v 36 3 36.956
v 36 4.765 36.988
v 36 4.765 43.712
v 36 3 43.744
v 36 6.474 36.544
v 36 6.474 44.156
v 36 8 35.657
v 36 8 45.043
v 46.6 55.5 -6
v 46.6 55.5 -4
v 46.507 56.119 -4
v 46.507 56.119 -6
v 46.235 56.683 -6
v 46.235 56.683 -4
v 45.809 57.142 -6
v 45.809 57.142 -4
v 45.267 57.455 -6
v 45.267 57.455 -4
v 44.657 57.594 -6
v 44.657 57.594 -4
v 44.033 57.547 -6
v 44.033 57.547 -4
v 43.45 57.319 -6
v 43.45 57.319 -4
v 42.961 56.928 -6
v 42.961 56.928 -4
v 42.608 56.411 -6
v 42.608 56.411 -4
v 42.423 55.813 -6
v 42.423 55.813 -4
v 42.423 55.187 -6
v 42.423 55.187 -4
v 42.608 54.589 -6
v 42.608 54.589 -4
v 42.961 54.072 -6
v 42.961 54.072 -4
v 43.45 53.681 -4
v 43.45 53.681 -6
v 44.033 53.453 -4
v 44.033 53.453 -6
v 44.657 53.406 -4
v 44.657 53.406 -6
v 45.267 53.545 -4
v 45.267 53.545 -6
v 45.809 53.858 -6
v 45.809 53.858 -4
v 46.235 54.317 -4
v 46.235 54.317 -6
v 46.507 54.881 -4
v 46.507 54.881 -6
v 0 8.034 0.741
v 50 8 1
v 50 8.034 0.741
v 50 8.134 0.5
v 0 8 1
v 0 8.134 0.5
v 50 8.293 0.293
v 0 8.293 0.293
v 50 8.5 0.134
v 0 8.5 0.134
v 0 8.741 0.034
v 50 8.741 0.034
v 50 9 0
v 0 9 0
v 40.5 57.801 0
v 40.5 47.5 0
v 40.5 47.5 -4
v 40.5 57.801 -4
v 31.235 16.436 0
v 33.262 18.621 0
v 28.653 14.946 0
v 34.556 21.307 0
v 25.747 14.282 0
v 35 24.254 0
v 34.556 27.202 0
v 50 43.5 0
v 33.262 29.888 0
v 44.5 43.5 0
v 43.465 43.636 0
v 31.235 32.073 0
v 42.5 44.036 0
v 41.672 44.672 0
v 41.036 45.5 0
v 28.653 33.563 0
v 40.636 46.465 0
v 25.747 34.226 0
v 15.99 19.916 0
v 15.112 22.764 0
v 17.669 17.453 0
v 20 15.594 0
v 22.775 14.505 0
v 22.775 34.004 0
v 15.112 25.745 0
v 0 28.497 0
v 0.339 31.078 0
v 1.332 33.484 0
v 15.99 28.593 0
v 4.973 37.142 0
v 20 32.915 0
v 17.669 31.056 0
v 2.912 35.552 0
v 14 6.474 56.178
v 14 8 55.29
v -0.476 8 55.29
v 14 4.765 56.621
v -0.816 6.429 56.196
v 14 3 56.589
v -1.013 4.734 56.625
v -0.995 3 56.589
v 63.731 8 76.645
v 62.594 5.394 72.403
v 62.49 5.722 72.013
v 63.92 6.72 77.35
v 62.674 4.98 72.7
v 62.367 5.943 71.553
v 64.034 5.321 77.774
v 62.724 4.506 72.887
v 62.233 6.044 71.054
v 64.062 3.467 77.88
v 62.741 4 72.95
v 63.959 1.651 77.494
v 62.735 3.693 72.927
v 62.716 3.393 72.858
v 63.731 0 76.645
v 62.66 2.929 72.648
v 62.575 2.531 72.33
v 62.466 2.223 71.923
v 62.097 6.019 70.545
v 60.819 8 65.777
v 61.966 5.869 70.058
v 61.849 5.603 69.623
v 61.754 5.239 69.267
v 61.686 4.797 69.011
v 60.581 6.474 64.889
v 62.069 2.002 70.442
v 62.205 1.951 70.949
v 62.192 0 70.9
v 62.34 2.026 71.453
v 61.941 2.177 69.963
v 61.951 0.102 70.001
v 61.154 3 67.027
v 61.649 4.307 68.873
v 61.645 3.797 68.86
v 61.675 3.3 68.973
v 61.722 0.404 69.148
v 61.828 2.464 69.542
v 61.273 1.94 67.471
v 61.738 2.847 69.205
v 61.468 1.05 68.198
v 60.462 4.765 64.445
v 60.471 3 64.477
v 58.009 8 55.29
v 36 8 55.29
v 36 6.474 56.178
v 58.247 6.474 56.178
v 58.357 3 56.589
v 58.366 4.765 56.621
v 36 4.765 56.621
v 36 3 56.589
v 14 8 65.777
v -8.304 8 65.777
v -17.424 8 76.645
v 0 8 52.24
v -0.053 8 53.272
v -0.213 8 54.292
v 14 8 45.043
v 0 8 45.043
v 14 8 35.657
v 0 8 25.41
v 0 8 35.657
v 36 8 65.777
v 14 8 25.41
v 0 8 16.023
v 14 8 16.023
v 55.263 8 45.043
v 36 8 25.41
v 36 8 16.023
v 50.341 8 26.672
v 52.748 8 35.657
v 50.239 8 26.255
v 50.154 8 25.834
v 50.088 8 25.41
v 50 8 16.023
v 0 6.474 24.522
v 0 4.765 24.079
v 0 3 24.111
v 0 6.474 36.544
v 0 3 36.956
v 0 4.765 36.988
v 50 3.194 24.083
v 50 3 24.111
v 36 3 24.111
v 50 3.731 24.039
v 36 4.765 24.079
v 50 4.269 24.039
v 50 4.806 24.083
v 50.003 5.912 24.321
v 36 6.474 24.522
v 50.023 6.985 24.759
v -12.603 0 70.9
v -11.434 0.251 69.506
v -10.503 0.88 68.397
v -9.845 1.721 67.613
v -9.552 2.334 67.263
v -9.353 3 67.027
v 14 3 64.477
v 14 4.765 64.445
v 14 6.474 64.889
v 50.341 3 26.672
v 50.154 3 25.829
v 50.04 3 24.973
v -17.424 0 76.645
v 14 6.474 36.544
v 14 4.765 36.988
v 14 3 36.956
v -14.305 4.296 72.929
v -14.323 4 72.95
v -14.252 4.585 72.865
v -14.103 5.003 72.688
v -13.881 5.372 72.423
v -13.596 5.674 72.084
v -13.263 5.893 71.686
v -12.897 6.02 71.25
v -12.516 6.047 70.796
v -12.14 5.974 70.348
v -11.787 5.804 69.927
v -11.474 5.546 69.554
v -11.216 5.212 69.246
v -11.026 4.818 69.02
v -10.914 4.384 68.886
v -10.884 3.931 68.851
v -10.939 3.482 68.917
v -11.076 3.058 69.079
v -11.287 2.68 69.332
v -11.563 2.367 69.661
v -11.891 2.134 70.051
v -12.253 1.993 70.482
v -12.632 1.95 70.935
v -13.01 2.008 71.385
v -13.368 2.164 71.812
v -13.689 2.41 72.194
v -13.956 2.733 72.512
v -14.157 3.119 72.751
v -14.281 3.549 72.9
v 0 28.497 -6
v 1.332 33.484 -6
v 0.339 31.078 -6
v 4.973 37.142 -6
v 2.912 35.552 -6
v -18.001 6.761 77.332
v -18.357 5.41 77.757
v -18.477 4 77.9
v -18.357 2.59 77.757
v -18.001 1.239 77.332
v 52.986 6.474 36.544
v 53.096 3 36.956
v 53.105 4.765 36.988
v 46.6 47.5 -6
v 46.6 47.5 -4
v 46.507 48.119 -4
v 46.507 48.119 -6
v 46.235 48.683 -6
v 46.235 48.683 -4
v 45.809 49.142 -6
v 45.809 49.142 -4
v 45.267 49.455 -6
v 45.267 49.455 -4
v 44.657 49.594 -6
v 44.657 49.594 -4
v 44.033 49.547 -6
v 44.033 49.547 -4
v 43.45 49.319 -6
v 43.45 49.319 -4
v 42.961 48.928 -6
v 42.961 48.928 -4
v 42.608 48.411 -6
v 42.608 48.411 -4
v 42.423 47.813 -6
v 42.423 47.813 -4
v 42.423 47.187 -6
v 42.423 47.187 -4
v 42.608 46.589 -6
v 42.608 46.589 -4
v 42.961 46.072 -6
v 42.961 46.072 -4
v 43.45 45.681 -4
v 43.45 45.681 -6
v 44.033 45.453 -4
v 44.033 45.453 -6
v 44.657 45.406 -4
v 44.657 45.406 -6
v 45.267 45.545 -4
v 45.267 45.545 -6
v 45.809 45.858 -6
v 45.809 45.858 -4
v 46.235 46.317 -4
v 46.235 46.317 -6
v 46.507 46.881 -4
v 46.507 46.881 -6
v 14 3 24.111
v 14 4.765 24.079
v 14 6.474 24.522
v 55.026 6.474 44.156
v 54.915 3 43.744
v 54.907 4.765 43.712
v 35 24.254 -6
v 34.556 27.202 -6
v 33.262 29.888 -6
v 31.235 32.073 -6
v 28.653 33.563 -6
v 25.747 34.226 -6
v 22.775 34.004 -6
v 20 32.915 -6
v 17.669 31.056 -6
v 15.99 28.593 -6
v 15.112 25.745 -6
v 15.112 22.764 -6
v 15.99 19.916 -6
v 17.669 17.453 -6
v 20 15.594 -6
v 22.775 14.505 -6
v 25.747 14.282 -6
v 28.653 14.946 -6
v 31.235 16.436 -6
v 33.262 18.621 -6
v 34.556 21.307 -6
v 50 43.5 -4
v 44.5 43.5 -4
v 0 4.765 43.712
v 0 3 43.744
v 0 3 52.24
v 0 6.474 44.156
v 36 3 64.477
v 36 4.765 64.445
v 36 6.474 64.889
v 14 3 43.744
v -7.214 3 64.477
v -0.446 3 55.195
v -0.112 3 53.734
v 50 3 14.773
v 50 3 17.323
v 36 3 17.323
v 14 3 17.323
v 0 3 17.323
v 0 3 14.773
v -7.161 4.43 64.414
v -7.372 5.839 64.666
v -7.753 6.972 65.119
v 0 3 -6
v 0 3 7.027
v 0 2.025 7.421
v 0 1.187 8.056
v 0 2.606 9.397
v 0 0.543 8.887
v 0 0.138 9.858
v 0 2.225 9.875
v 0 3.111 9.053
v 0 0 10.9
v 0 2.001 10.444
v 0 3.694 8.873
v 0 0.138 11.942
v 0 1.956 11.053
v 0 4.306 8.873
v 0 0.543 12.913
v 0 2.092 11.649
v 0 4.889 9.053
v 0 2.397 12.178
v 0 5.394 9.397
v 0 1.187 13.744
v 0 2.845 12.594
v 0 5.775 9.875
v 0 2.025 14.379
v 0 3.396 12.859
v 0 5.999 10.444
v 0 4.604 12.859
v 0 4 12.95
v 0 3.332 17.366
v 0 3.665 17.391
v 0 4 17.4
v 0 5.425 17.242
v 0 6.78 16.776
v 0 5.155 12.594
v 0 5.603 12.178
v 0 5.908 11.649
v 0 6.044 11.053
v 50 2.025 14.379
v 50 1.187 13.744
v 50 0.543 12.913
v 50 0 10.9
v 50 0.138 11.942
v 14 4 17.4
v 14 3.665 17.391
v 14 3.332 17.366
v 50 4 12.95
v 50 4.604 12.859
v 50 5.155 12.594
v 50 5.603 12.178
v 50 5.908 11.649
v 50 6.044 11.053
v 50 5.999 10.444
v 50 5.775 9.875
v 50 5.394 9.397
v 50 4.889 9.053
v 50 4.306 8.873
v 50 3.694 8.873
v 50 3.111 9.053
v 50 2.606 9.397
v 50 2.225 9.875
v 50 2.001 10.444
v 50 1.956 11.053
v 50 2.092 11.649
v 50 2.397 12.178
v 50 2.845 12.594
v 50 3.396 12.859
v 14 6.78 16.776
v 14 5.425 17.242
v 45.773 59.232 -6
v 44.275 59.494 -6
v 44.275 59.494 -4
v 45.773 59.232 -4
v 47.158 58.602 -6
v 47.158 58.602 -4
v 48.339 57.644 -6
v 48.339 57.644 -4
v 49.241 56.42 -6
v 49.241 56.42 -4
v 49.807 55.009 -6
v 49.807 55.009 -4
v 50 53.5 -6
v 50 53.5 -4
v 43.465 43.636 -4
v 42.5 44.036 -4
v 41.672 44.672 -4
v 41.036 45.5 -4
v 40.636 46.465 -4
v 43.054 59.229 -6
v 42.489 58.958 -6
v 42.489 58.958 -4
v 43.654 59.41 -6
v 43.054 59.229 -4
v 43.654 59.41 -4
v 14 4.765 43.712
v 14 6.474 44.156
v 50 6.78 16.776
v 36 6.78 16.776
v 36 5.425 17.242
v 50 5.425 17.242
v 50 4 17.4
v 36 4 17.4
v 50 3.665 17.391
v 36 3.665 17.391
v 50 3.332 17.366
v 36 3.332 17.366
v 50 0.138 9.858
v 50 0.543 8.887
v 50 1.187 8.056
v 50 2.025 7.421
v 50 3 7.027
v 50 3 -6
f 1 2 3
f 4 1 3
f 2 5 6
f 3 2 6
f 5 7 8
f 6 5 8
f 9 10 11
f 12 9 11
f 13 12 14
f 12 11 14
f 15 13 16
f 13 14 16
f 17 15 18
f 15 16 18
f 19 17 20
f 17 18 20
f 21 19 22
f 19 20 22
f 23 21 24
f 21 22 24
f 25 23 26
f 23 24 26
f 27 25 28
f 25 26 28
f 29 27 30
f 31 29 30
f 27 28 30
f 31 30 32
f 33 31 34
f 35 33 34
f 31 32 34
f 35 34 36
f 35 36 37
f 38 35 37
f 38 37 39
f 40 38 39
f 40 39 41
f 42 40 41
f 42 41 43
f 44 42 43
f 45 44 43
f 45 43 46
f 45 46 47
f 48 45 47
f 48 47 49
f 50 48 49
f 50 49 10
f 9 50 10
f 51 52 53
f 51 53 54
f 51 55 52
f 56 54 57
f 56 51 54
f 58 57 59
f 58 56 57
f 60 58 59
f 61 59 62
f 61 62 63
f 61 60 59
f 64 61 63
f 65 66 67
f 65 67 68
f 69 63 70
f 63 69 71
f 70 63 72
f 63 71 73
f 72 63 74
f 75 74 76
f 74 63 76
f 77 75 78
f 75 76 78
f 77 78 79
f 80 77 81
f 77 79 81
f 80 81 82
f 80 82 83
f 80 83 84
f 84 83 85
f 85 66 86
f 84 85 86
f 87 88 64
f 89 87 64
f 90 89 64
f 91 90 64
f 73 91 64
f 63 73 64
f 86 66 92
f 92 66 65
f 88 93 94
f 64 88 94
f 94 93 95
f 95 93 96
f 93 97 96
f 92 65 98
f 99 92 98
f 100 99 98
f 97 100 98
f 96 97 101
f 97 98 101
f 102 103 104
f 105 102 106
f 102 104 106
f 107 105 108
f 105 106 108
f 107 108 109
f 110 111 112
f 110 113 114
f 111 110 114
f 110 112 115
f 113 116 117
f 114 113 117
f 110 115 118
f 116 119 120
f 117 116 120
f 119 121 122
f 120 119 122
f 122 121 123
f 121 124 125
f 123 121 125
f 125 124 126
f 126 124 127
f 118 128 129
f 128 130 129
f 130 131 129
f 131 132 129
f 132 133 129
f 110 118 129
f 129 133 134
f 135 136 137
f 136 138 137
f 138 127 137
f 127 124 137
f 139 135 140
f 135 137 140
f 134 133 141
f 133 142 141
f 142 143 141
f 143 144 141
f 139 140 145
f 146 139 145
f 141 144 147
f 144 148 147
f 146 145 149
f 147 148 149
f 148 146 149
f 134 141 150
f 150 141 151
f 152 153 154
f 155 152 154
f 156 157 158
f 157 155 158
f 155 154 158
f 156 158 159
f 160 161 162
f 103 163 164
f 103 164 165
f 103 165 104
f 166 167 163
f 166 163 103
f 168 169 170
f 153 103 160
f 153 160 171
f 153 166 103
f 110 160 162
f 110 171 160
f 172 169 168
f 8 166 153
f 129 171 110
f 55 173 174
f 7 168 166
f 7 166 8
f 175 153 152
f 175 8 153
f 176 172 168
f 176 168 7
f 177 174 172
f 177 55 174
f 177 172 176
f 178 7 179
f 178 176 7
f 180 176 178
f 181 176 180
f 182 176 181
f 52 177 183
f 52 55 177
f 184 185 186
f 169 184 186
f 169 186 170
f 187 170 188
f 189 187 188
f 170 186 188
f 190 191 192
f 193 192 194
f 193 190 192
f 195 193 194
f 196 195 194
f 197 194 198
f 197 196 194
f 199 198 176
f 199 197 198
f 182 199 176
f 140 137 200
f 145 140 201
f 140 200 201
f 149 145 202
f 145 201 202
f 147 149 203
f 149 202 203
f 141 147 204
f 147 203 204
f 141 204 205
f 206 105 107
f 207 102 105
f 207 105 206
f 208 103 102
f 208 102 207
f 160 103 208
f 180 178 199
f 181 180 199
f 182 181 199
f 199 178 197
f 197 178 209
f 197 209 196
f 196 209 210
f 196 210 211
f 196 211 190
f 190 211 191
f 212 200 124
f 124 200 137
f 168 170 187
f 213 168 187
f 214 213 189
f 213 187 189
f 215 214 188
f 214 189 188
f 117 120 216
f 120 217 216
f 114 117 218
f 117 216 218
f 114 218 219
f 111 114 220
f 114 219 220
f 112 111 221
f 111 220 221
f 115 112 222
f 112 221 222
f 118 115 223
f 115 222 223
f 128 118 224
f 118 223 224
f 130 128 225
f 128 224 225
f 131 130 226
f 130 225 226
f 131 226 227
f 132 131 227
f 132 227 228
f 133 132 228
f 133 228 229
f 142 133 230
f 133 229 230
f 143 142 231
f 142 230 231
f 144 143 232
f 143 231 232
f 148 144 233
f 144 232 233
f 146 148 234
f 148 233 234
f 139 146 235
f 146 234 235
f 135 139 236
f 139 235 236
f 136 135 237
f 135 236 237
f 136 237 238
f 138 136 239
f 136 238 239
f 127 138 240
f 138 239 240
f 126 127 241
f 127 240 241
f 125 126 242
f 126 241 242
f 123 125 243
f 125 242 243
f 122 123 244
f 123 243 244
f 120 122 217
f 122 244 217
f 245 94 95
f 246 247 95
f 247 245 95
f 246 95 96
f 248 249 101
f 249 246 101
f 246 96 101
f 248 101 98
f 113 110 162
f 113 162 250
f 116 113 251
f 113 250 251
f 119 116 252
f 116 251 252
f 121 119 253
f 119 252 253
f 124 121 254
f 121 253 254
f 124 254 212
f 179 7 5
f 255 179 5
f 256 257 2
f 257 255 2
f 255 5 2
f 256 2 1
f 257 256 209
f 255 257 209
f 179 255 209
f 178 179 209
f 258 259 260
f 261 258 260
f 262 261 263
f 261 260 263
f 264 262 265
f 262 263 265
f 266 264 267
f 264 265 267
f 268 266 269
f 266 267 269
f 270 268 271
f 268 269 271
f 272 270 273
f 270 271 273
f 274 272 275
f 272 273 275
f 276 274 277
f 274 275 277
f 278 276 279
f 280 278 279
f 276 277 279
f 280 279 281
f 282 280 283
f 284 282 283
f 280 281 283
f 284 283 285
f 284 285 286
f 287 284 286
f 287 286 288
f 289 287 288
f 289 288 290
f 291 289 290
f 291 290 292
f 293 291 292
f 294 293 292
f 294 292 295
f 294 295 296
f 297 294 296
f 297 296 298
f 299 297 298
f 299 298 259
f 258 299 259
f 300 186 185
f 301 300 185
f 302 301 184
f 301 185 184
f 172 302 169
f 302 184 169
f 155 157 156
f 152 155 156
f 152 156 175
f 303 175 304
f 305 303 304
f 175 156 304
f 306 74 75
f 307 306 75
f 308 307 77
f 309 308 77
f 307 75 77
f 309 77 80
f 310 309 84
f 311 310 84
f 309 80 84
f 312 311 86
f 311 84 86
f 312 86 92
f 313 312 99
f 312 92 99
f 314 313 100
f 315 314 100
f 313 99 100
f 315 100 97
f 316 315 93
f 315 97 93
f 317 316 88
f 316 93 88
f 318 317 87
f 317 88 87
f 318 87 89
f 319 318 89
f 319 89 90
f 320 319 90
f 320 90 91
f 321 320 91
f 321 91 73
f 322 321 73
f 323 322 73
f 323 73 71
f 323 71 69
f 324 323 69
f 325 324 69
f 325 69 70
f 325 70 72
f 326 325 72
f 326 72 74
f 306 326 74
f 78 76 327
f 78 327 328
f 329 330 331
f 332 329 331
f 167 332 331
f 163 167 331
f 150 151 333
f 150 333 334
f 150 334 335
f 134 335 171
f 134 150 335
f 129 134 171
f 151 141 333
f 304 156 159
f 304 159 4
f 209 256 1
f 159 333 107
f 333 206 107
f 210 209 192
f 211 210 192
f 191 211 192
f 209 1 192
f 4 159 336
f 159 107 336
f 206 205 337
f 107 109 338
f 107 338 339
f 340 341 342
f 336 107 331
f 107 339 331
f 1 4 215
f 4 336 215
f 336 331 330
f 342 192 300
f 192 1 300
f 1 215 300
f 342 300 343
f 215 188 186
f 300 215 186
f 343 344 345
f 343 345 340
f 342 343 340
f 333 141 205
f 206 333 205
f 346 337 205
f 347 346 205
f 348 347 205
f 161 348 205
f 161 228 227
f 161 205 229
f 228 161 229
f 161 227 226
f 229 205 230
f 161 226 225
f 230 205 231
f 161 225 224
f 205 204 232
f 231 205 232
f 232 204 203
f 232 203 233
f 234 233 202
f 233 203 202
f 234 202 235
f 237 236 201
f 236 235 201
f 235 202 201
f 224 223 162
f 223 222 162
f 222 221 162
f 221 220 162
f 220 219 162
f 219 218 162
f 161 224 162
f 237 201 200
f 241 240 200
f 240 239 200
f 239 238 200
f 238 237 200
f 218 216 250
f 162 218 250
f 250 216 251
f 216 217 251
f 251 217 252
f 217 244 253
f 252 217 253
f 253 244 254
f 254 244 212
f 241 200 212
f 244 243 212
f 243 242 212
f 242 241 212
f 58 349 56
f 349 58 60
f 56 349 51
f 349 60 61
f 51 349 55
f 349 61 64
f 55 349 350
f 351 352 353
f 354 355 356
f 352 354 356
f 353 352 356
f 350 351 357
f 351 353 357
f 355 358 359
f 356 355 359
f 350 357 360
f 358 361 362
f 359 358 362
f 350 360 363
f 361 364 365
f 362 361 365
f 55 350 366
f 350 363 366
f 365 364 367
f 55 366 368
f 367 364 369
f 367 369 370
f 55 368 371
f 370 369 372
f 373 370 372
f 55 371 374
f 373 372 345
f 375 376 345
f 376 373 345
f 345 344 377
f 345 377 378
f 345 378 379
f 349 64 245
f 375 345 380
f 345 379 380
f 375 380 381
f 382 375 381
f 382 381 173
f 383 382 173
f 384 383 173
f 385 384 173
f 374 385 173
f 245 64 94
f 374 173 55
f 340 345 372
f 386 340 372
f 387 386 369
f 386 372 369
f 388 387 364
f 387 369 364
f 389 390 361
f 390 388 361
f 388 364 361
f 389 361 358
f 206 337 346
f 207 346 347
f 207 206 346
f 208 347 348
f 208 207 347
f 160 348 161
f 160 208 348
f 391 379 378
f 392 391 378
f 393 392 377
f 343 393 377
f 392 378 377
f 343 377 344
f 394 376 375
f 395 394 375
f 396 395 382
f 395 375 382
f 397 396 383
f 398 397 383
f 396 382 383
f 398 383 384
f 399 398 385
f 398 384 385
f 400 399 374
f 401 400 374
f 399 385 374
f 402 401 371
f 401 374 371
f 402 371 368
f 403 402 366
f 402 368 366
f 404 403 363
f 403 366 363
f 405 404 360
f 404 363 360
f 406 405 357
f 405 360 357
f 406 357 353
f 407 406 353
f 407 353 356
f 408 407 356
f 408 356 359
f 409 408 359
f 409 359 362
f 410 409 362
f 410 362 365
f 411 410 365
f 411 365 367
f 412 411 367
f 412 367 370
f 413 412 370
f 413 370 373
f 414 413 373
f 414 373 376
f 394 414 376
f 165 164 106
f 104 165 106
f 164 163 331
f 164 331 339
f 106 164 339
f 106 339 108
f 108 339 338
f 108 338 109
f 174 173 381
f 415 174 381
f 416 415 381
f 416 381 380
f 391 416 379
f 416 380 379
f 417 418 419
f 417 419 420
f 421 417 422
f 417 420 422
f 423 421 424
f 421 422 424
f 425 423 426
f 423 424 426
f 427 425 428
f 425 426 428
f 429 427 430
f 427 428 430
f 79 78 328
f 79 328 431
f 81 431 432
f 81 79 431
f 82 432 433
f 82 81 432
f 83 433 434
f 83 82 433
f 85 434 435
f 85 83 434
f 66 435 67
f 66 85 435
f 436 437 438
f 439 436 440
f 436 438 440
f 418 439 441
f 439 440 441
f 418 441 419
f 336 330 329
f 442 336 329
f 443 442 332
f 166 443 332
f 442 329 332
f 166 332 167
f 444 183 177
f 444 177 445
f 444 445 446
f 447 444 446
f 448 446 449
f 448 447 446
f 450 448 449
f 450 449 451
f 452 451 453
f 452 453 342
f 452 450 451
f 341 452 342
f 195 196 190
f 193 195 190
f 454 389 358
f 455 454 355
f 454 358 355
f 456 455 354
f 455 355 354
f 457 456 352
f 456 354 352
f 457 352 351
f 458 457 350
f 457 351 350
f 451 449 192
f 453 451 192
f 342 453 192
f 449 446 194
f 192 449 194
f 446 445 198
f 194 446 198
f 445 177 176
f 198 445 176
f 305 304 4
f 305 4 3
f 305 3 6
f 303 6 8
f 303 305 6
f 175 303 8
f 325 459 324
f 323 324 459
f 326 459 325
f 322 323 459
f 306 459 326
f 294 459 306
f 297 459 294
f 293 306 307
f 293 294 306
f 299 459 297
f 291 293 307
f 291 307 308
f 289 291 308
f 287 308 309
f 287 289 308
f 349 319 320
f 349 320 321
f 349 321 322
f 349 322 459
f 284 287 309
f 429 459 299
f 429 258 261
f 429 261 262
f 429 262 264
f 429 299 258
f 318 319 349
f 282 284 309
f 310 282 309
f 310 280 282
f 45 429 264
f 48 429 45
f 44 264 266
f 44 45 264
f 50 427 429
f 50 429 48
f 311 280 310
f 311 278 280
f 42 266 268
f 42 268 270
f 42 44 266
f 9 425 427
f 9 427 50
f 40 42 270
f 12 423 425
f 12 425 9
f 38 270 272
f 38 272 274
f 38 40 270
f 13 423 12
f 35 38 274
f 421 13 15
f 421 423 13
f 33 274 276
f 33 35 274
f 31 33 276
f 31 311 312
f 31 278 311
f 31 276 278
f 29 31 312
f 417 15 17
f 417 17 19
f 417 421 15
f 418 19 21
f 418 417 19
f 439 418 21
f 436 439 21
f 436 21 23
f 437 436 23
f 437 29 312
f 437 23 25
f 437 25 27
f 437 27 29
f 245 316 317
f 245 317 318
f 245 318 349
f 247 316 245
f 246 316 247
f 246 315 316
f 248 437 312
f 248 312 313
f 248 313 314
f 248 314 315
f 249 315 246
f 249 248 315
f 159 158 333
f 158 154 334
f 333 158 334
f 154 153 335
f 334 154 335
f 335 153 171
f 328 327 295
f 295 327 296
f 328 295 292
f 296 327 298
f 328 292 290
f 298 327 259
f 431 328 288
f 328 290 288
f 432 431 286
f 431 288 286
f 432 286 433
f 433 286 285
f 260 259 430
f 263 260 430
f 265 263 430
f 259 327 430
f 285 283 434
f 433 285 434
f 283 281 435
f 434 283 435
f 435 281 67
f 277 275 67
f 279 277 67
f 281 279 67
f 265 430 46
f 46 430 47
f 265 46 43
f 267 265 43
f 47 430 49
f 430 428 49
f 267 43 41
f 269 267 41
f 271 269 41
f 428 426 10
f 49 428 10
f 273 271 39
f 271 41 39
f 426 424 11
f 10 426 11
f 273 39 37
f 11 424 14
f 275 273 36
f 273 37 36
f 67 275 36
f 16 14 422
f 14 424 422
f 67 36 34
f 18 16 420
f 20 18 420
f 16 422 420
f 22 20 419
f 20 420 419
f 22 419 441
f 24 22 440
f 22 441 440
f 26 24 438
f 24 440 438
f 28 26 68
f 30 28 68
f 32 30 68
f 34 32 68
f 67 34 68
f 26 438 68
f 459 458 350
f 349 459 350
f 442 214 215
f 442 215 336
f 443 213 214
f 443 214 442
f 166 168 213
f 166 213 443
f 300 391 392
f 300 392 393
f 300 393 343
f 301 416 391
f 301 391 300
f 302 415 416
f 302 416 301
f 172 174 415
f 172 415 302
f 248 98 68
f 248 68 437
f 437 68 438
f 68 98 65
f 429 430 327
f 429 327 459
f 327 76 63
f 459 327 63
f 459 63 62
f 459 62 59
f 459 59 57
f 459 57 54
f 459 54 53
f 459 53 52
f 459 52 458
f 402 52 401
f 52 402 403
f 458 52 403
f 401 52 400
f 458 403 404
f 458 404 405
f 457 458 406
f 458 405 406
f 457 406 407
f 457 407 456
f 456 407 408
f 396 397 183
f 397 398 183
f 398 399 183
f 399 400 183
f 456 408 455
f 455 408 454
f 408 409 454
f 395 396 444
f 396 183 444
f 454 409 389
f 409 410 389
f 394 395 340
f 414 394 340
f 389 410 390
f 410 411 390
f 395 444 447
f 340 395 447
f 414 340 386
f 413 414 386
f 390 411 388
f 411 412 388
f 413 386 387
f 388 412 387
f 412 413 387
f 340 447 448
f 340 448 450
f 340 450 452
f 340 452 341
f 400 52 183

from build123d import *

# Parameters (mm, degrees)
BOSS_EXTRUDE1_DEPTH     = 8
SKETCH2_R               = 2.05
CUT_EXTRUDE1_DEPTH      = 28.707069821
CUT_EXTRUDE1_DEPTH_BACK = 68.014773719
CUT_EXTRUDE2_DEPTH      = 28.707069821
CUT_EXTRUDE2_DEPTH_BACK = 68.014773719
CUT_EXTRUDE3_DEPTH      = 19.476973879
CUT_EXTRUDE3_DEPTH_BACK = 14
CUT_EXTRUDE4_START      = -50
CUT_EXTRUDE4_DEPTH      = 14
CUT_EXTRUDE4_DEPTH_BACK = 15.067332603
BOSS_EXTRUDE2_DEPTH     = 6
FILLET8_R               = 1
SKETCH7_R               = 2.1
SKETCH7_R_2             = 10
CUT_EXTRUDE5_DEPTH      = 7
CUT_EXTRUDE6_DEPTH      = 4


with BuildPart() as part:
    # Sketch1 → Boss-Extrude1 (new body)
    with BuildSketch(Plane(origin=(0, 0, 0), x_dir=(1, 0, 0), z_dir=(0, 1, 0))):
        with BuildLine():
            Line((0, 0), (0, -52.240297657))
            ThreePointArc((0, -52.240297657), (-0.603073792, -55.660499091), (-2.339555569, -58.668173754))
            Line((-2.339555569, -58.668173754), (-27.707069821, -88.9))
            Line((-27.707069821, -88.9), (67.014773719, -88.9))
            Line((67.014773719, -88.9), (50.340741737, -26.671665475))
            ThreePointArc((50.340741737, -26.671665475), (50.085551386, -25.388736946), (50, -24.083475024))
            Line((50, -24.083475024), (50, 0))
            Line((50, 0), (0, 0))
        make_face()
    extrude(amount=BOSS_EXTRUDE1_DEPTH)

    # Sketch2 → Cut-Extrude1 (cut, two sides)
    with BuildSketch(Plane.ZY) as cut_extrude1_sk:
        with Locations((10.9, 4)):
            Circle(SKETCH2_R)
        with Locations((70.9, 4)):
            Circle(SKETCH2_R)
    extrude(amount=CUT_EXTRUDE1_DEPTH, mode=Mode.SUBTRACT)
    extrude(cut_extrude1_sk.sketch, amount=-CUT_EXTRUDE1_DEPTH_BACK, mode=Mode.SUBTRACT)

    # Sketch4 → Cut-Extrude2 (cut, two sides)
    with BuildSketch(Plane.ZY) as cut_extrude2_sk:
        with BuildLine():
            Line((67.027016654, 3), (14.772983346, 3))
            ThreePointArc((14.772983346, 3), (13.349489743, 0.83772234), (10.9, 0))
            Line((10.9, 0), (70.9, 0))
            ThreePointArc((70.9, 0), (68.450510257, 0.83772234), (67.027016654, 3))
        make_face()
        with BuildLine():
            Line((0, 0), (10.9, 0))
            ThreePointArc((10.9, 0), (8.450510257, 0.83772234), (7.027016654, 3))
            Line((7.027016654, 3), (0, 3))
            Line((0, 3), (0, 0))
        make_face()
        with BuildLine():
            ThreePointArc((76.644562647, 8), (77.9, 4), (76.644562647, 0))
            Line((76.644562647, 0), (88.9, 0))
            Line((88.9, 0), (88.9, 8))
            Line((88.9, 8), (76.644562647, 8))
        make_face()
    extrude(amount=CUT_EXTRUDE2_DEPTH, mode=Mode.SUBTRACT)
    extrude(cut_extrude2_sk.sketch, amount=-CUT_EXTRUDE2_DEPTH_BACK, mode=Mode.SUBTRACT)

    # Sketch5 → Cut-Extrude3 (cut, two sides)
    with BuildSketch(Plane.ZY) as cut_extrude3_sk:
        with BuildLine():
            Line((30.53333333, 10.5), (10.9, 10.5))
            ThreePointArc((10.9, 10.5), (13.750438563, 9.841660723), (16.023475383, 8))
            Line((16.023475383, 8), (25.409857947, 8))
            ThreePointArc((25.409857947, 8), (27.682894767, 9.841660723), (30.53333333, 10.5))
        make_face()
        with BuildLine():
            Line((25.409857947, 8), (16.023475383, 8))
            ThreePointArc((16.023475383, 8), (17.046242348, 6.115113473), (17.4, 4))
            ThreePointArc((17.4, 4), (17.380625197, 3.498505175), (17.322616289, 3))
            Line((17.322616289, 3), (24.110717041, 3))
            ThreePointArc((24.110717041, 3), (24.242223871, 5.634607529), (25.409857947, 8))
        make_face()
        with BuildLine():
            Line((45.043191277, 8), (35.656808713, 8))
            ThreePointArc((35.656808713, 8), (36.824442789, 5.634607529), (36.955949619, 3))
            Line((36.955949619, 3), (43.744050371, 3))
            ThreePointArc((43.744050371, 3), (43.875557201, 5.634607529), (45.043191277, 8))
        make_face()
        with BuildLine():
            Line((50.166666628, 10.5), (30.53333333, 10.5))
            ThreePointArc((30.53333333, 10.5), (33.383771893, 9.841660723), (35.656808713, 8))
            Line((35.656808713, 8), (45.043191277, 8))
            ThreePointArc((45.043191277, 8), (47.316228083, 9.841660716), (50.166666628, 10.5))
        make_face()
        with BuildLine():
            Line((70.9, 10.5), (50.166666628, 10.5))
            ThreePointArc((50.166666628, 10.5), (55.103771064, 8.227883644), (56.589282949, 3))
            Line((56.589282949, 3), (64.477383711, 3))
            ThreePointArc((64.477383711, 3), (65.962895585, 8.227883631), (70.9, 10.5))
        make_face()
    extrude(amount=CUT_EXTRUDE3_DEPTH, mode=Mode.SUBTRACT)
    extrude(cut_extrude3_sk.sketch, amount=-CUT_EXTRUDE3_DEPTH_BACK, mode=Mode.SUBTRACT)

    # Sketch5<3> → Cut-Extrude4 (cut, two sides)
    with BuildSketch(Plane.ZY.offset(CUT_EXTRUDE4_START)) as cut_extrude4_sk:
        with BuildLine():
            Line((25.409857947, 8), (16.023475383, 8))
            ThreePointArc((16.023475383, 8), (17.046242348, 6.115113473), (17.4, 4))
            ThreePointArc((17.4, 4), (17.380625197, 3.498505175), (17.322616289, 3))
            Line((17.322616289, 3), (24.110717041, 3))
            ThreePointArc((24.110717041, 3), (24.242223871, 5.634607529), (25.409857947, 8))
        make_face()
        with BuildLine():
            Line((45.043191277, 8), (35.656808713, 8))
            ThreePointArc((35.656808713, 8), (36.824442789, 5.634607529), (36.955949619, 3))
            Line((36.955949619, 3), (43.744050371, 3))
            ThreePointArc((43.744050371, 3), (43.875557201, 5.634607529), (45.043191277, 8))
        make_face()
        with BuildLine():
            Line((70.9, 10.5), (50.166666628, 10.5))
            ThreePointArc((50.166666628, 10.5), (55.103771064, 8.227883644), (56.589282949, 3))
            Line((56.589282949, 3), (64.477383711, 3))
            ThreePointArc((64.477383711, 3), (65.962895585, 8.227883631), (70.9, 10.5))
        make_face()
    extrude(amount=CUT_EXTRUDE4_DEPTH, mode=Mode.SUBTRACT)
    extrude(cut_extrude4_sk.sketch, amount=-CUT_EXTRUDE4_DEPTH_BACK, mode=Mode.SUBTRACT)

    # Sketch6 → Boss-Extrude2 (add)
    with BuildSketch(Plane(origin=(0, 0, 0), x_dir=(-1, 0, 0), z_dir=(0, 0, -1))):
        with BuildLine():
            Line((-50, 3), (0, 3))
            Line((0, 3), (0, 53.5))
            ThreePointArc((0, 53.5), (-1.757359313, 57.742640687), (-6, 59.5))
            Line((-6, 59.5), (-44, 59.5))
            ThreePointArc((-44, 59.5), (-48.242640687, 57.742640687), (-50, 53.5))
            Line((-50, 53.5), (-50, 3))
        make_face()
    extrude(amount=BOSS_EXTRUDE2_DEPTH)

    # Fillet8
    fillet8_edges = [part.edges().sort_by_distance(p)[0] for p in [
        (25, 8, 0),
    ]]
    fillet(fillet8_edges, radius=FILLET8_R)

    # Sketch7 → Cut-Extrude5 (cut, through all)
    with BuildSketch(Plane.XY):
        with BuildLine():
            ThreePointArc((0, 28.497233906), (1.331973251, 33.483746944), (4.973062456, 37.141879586))
            Line((4.973062456, 37.141879586), (42.489224982, 58.957858272))
            ThreePointArc((42.489224982, 58.957858272), (43.458710676, 59.362087071), (44.5, 59.5))
            Line((44.5, 59.5), (0, 59.5))
            Line((0, 59.5), (0, 28.497233906))
        make_face()
        with Locations((44.5, 47.5)):
            Circle(SKETCH7_R)
        with Locations((44.5, 55.5)):
            Circle(SKETCH7_R)
        with Locations((25, 24.254421738)):
            Circle(SKETCH7_R_2)
    extrude(amount=-CUT_EXTRUDE5_DEPTH, mode=Mode.SUBTRACT)

    # Sketch8 → Cut-Extrude6 (cut)
    with BuildSketch(Plane.XY):
        with BuildLine():
            Line((40.5, 47.5), (40.5, 55.5))
            Line((40.5, 55.5), (40.5, 57.801106438))
            Line((40.5, 57.801106438), (40.5, 59.687082669))
            Line((40.5, 59.687082669), (50, 59.687082669))
            Line((50, 59.687082669), (50, 43.5))
            Line((50, 43.5), (44.5, 43.5))
            ThreePointArc((44.5, 43.5), (41.671572875, 44.671572875), (40.5, 47.5))
        make_face()
    extrude(amount=-CUT_EXTRUDE6_DEPTH, mode=Mode.SUBTRACT)


solid = part.part
